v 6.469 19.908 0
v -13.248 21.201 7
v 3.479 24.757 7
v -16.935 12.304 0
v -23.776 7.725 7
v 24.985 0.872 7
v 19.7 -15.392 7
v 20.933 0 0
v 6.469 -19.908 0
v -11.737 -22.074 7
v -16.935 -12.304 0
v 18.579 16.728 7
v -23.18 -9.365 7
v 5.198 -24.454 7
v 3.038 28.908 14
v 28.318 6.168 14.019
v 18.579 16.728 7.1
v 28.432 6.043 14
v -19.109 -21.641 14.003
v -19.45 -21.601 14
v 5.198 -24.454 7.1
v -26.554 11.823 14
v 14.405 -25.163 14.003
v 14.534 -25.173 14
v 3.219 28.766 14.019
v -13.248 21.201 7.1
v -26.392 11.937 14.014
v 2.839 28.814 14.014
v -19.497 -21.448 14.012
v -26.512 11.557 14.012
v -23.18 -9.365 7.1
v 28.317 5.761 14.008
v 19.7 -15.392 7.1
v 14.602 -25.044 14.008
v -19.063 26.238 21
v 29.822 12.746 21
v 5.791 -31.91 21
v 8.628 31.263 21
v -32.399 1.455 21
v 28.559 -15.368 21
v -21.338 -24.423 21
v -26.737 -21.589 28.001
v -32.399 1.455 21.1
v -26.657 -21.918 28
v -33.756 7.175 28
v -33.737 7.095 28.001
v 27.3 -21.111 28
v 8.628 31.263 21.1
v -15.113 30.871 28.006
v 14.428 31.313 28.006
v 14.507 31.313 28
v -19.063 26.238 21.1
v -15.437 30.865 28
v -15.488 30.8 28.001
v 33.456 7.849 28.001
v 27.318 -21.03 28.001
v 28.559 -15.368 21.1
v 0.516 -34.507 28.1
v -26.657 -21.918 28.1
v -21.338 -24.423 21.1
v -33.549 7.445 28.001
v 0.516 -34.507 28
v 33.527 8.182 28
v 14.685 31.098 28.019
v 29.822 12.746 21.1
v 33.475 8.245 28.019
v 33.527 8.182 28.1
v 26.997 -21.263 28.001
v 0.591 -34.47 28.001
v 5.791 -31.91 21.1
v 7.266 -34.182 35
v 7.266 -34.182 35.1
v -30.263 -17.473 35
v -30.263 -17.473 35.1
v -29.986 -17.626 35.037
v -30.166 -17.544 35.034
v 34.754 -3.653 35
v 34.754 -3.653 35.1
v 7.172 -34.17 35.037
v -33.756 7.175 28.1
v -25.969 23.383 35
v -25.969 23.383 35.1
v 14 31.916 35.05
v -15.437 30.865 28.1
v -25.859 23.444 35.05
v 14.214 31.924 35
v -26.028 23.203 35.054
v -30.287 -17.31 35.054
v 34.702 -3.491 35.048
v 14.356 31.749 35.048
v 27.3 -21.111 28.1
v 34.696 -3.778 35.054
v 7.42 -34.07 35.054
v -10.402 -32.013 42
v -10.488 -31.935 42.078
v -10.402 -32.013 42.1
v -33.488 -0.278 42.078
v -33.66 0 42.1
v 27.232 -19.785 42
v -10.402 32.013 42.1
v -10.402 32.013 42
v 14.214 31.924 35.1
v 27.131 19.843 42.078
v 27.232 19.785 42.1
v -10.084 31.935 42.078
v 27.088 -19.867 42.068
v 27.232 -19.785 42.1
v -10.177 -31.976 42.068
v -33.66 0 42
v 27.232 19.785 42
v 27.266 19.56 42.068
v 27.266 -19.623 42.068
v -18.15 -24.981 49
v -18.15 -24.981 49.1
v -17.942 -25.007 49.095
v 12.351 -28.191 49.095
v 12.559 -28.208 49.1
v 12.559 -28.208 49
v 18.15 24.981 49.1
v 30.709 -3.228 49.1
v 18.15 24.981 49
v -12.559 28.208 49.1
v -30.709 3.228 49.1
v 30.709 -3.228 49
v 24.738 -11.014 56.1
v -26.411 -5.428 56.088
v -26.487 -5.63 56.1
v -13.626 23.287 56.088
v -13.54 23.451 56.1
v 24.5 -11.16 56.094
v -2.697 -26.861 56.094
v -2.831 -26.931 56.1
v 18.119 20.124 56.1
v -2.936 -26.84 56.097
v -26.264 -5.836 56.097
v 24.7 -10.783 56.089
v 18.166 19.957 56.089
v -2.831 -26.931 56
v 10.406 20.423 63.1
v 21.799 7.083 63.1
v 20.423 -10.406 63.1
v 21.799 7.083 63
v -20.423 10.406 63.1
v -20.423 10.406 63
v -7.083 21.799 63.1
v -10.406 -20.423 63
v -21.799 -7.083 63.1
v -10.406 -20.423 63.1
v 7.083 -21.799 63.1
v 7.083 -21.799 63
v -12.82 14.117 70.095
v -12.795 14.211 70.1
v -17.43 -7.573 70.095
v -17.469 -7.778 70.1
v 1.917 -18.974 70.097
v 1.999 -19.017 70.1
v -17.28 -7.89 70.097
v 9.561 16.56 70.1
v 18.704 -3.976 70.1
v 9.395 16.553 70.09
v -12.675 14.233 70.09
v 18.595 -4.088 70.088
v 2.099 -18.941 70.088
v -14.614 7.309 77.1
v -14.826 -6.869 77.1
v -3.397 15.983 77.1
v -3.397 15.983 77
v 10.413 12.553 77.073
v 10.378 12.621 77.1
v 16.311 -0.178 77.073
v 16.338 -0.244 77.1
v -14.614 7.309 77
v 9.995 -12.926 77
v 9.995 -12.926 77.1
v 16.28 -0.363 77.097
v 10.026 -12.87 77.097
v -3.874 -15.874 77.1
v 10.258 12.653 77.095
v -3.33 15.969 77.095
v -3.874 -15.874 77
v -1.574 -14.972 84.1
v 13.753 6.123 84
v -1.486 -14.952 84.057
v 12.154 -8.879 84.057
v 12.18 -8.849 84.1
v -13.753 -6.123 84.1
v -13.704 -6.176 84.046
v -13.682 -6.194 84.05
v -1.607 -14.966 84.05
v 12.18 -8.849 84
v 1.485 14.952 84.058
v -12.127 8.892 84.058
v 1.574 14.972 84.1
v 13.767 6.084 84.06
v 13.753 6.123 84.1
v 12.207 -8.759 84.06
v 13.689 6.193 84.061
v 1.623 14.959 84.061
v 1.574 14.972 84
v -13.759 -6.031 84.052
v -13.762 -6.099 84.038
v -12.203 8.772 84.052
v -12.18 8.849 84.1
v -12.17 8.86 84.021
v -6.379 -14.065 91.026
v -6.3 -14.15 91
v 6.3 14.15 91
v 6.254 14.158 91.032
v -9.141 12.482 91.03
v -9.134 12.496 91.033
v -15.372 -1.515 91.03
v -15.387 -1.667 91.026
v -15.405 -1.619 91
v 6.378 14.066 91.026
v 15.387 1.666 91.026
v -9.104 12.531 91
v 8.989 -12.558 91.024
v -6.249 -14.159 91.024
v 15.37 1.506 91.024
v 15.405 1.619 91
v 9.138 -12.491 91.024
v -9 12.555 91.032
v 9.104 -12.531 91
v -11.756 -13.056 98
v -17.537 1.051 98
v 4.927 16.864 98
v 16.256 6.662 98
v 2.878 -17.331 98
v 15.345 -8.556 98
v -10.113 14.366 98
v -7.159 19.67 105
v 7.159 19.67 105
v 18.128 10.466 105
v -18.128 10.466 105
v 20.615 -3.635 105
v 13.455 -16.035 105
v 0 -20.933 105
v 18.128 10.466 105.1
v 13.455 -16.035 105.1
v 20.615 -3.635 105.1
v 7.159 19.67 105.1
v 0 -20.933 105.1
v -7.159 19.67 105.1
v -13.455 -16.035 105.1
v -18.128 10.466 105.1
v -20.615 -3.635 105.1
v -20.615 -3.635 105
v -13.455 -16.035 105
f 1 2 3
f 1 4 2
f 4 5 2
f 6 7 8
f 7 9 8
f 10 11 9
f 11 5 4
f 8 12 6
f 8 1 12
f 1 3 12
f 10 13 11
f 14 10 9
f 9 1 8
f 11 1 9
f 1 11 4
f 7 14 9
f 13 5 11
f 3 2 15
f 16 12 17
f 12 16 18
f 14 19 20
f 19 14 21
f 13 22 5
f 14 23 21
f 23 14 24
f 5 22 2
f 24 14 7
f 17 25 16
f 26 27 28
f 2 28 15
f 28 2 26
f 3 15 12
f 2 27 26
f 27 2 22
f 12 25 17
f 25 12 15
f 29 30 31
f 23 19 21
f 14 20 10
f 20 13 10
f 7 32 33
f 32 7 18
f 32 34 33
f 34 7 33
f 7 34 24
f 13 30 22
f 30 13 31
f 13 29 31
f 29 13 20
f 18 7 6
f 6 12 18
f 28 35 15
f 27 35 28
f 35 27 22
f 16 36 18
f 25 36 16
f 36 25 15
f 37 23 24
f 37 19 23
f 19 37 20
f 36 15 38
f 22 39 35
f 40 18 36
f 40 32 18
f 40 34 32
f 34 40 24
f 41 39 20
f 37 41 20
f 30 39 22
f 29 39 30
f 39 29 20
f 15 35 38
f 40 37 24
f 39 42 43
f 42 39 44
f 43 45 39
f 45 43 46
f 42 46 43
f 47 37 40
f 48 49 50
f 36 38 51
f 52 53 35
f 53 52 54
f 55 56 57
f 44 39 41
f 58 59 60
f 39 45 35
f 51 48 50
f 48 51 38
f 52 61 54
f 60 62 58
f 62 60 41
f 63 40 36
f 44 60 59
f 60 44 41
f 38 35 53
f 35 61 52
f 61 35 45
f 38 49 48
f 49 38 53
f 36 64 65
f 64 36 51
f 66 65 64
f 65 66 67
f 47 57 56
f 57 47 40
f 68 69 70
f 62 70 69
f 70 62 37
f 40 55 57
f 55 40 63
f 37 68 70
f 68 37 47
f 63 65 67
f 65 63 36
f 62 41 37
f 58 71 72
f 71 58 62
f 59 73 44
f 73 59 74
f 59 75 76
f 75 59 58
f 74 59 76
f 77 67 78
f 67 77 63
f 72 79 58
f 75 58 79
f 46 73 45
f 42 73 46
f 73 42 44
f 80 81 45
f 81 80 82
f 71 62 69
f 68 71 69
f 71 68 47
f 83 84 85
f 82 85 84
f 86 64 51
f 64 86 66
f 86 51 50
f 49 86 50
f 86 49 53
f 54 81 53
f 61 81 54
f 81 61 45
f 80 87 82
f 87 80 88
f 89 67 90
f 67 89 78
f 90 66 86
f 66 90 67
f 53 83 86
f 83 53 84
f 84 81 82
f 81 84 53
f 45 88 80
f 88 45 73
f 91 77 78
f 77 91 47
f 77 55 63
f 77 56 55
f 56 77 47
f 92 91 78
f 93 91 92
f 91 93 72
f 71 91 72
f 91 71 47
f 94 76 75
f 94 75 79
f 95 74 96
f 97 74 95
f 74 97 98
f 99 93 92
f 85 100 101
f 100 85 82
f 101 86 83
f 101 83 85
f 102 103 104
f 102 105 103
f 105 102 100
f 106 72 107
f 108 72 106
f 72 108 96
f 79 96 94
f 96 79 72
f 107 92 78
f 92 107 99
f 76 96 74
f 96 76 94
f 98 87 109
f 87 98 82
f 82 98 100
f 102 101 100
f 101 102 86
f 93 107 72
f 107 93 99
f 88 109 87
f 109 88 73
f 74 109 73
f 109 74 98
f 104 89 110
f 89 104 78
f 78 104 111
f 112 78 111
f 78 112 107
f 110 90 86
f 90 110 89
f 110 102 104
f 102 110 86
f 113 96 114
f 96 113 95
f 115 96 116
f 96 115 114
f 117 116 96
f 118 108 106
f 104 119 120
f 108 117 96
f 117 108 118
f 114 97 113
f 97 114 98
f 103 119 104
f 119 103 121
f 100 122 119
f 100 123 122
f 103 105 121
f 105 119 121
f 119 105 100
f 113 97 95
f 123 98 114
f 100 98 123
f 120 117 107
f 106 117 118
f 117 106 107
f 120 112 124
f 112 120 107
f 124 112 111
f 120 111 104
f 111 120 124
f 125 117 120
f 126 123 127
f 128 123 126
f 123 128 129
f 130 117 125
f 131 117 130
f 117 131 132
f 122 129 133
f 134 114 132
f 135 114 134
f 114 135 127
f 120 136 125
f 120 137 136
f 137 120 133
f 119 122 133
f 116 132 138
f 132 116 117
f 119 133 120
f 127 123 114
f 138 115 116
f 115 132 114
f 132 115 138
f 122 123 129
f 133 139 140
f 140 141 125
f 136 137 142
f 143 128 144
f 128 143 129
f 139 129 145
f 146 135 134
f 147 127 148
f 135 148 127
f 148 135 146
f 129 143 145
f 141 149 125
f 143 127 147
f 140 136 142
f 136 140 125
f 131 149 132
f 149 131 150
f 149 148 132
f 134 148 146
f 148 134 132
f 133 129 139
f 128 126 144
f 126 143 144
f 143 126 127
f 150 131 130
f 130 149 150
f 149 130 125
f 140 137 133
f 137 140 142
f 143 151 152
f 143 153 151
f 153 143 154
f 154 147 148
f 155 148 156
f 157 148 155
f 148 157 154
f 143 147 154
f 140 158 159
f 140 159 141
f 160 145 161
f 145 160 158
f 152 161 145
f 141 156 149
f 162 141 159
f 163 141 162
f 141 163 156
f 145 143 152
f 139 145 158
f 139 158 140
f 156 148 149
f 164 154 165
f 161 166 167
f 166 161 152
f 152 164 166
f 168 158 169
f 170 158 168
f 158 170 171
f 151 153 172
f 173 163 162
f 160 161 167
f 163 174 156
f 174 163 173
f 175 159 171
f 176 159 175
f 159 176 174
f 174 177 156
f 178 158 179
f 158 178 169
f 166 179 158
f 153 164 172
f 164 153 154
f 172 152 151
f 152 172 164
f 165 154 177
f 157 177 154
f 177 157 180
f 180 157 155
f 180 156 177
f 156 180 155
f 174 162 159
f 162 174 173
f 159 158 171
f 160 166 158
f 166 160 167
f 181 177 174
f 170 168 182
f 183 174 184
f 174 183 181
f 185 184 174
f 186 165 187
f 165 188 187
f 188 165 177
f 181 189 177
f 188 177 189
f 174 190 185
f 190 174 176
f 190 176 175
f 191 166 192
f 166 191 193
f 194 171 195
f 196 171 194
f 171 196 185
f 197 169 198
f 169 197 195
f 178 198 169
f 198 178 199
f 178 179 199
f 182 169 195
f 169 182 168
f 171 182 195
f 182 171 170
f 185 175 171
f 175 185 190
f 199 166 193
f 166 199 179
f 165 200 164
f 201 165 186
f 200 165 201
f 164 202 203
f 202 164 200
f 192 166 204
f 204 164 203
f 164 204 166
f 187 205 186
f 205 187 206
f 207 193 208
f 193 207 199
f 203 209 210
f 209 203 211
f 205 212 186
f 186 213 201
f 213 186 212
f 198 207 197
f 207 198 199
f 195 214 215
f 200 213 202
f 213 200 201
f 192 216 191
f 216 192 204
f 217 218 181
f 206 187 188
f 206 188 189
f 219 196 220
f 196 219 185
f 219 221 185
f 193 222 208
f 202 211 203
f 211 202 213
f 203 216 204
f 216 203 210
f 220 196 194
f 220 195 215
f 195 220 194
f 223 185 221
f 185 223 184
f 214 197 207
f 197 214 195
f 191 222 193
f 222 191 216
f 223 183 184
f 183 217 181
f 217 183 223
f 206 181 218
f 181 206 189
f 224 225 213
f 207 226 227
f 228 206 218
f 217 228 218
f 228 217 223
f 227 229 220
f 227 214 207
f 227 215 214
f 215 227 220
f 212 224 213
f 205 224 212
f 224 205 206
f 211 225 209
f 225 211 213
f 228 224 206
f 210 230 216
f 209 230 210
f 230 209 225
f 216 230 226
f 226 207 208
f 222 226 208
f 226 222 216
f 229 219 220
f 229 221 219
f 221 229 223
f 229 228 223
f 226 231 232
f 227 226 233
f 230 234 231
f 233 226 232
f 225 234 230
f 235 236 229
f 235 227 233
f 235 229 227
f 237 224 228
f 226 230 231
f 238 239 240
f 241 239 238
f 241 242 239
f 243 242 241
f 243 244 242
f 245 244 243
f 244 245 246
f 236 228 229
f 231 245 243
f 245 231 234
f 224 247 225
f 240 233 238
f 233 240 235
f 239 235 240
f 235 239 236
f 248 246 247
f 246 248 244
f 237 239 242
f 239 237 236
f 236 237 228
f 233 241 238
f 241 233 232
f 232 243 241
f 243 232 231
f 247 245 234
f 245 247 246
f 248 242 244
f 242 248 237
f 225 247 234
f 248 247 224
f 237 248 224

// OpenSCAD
/*
	Tjark's low poly random sinus vase
	A parametric Vase with random cornercount per layer. Actually this model isn't a hollow body. You have to configure your 3D-slicer to "vase mode". Play around with the given parameters.
	Author: Tjark alias Shark
	Contact: www.thingiverse.com/SharkNado
	
	License: Public domain - do whatever you want (just please dont claim you made it)
    
    Version: 0.1	
*/

//Layers
layers = 15;  // [2:200]

//Layerheight
layerHeight = 7;

//Radius Offset
radiusOffset = 50;

//Amplitude
amp = 20;

//Random Seed
randSeed = 3;

//Rotation per layer
rotateZ=42;

//Phase Shift
phase = 0;

//Minimum Edges
minEdges = 5; //[3:100]

//Maximum Edges
maxEdges = 10; //[3:100]





fns=rands(minEdges,maxEdges,layers+1,randSeed);



for(h=[0:layers-1]){
    rgb(100/layers*(layers-h),20,100/layers*h)hull(){
        rotate([0,0,h*rotateZ]){
            translate([0,0,layerHeight*h])cylinder(d=dynamicRadius(h),h=0.1,$fn=fns[h]);
        }
        rotate([0,0,(h+1)*rotateZ]){
            translate([0,0,layerHeight*(h+1)]){
                cylinder(d=dynamicRadius(h+1),h=0.1,$fn=fns[h+1]);
            }
        }
       
    }
}
module rgb(r,g,b){
    color([r/100,g/100,b/100])children();
}

function dynamicRadius(h) = sin((h-1+phase)/(layers/2)*180)*amp+radiusOffset;
